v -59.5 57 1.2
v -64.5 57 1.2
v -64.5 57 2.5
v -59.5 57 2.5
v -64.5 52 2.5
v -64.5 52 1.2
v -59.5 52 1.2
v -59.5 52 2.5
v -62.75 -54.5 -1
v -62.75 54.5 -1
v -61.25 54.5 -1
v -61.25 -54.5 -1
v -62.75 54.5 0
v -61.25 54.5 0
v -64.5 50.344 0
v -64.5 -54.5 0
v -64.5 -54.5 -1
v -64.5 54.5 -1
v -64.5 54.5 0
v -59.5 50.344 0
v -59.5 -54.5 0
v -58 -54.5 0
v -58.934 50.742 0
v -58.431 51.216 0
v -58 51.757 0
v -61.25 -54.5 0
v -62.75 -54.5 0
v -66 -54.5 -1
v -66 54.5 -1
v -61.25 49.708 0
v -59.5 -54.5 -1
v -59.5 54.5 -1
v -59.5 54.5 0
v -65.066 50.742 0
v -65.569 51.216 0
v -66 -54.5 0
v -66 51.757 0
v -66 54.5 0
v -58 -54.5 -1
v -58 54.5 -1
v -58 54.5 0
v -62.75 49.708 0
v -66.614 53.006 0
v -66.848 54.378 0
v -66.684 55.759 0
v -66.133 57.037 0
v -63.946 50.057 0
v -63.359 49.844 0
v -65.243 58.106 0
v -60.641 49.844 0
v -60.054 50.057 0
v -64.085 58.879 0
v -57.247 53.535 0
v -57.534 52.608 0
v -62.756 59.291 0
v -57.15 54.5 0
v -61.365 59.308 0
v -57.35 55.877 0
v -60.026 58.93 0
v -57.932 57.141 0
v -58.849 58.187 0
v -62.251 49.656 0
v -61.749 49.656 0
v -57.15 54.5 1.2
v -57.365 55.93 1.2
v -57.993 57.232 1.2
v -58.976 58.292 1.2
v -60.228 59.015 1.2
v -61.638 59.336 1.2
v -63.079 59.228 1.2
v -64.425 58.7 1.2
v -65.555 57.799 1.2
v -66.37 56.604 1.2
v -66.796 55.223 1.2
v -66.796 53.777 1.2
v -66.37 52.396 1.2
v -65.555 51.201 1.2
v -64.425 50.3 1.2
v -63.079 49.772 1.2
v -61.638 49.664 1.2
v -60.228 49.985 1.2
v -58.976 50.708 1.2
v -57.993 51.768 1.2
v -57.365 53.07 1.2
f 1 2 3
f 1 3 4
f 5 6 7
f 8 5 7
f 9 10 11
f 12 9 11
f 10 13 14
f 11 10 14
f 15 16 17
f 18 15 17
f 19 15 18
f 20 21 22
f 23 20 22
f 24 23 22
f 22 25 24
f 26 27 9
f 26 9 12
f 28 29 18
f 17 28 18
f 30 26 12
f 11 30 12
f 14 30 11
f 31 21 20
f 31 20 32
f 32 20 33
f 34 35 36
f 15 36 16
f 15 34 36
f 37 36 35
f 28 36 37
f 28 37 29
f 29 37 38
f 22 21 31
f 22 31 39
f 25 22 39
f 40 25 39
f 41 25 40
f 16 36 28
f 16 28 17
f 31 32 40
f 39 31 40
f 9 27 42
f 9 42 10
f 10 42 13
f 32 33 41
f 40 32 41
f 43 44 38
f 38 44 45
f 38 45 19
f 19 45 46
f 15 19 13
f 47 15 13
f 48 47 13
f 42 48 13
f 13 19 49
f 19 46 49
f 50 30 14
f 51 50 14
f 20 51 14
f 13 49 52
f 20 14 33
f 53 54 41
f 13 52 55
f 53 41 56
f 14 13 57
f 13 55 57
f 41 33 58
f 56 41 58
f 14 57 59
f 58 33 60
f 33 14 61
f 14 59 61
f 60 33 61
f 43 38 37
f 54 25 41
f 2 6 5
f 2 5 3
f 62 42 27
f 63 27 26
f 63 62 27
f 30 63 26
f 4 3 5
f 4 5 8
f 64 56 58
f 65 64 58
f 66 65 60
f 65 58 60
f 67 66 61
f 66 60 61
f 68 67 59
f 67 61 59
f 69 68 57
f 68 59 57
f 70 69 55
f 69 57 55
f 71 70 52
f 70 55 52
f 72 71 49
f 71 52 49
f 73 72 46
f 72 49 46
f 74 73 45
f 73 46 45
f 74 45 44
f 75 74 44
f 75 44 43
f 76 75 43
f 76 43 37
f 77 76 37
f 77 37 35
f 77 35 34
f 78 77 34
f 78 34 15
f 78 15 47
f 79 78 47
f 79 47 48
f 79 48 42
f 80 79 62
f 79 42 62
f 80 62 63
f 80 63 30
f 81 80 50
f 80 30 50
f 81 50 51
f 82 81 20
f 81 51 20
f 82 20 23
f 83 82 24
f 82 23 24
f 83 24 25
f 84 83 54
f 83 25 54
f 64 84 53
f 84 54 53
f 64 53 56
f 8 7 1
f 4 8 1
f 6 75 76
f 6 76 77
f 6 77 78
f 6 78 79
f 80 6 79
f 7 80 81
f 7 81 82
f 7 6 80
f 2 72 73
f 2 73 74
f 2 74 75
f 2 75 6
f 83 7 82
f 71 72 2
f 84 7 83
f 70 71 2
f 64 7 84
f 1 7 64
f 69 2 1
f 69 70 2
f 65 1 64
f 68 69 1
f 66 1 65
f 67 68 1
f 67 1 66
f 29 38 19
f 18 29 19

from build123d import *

# Parameters (mm, degrees)
CYLINDER003_R     = 4.85
CYLINDER003_DEPTH = 1.2
SKETCH037_W       = 1.5
SKETCH037_H       = 109
PAD020_DEPTH      = 1
BOX001_W          = 5
BOX001_H          = 5
BOX001_DEPTH      = 1.5


with BuildPart() as part:
    # Cylinder003 → Cylinder003 (join)
    with BuildSketch(Plane(origin=(0, 54.5, 0), x_dir=(1, 0, 0), z_dir=(0, 0, 1))):
        Circle(CYLINDER003_R)
    extrude(amount=CYLINDER003_DEPTH)

    # Sketch037 → Pad020 (join)
    with BuildSketch(Plane.XY):
        with Locations((-3.25, 0)):
            Rectangle(SKETCH037_W, SKETCH037_H)
        with Locations((3.25, 0)):
            Rectangle(SKETCH037_W, SKETCH037_H)
        Rectangle(SKETCH037_W, SKETCH037_H)
    extrude(amount=-PAD020_DEPTH)

    # Box001 → Box001 (join)
    with BuildSketch(Plane(origin=(-2.5, 52, 1), x_dir=(1, 0, 0), z_dir=(0, 0, 1))):
        with Locations((2.5, 2.5)):
            Rectangle(BOX001_W, BOX001_H)
    extrude(amount=BOX001_DEPTH)


with BuildPart() as part_1:
    # Body019 placement: moved
    add(part.part.moved(Location((-62, 0, 0))))


solid = part_1.part
